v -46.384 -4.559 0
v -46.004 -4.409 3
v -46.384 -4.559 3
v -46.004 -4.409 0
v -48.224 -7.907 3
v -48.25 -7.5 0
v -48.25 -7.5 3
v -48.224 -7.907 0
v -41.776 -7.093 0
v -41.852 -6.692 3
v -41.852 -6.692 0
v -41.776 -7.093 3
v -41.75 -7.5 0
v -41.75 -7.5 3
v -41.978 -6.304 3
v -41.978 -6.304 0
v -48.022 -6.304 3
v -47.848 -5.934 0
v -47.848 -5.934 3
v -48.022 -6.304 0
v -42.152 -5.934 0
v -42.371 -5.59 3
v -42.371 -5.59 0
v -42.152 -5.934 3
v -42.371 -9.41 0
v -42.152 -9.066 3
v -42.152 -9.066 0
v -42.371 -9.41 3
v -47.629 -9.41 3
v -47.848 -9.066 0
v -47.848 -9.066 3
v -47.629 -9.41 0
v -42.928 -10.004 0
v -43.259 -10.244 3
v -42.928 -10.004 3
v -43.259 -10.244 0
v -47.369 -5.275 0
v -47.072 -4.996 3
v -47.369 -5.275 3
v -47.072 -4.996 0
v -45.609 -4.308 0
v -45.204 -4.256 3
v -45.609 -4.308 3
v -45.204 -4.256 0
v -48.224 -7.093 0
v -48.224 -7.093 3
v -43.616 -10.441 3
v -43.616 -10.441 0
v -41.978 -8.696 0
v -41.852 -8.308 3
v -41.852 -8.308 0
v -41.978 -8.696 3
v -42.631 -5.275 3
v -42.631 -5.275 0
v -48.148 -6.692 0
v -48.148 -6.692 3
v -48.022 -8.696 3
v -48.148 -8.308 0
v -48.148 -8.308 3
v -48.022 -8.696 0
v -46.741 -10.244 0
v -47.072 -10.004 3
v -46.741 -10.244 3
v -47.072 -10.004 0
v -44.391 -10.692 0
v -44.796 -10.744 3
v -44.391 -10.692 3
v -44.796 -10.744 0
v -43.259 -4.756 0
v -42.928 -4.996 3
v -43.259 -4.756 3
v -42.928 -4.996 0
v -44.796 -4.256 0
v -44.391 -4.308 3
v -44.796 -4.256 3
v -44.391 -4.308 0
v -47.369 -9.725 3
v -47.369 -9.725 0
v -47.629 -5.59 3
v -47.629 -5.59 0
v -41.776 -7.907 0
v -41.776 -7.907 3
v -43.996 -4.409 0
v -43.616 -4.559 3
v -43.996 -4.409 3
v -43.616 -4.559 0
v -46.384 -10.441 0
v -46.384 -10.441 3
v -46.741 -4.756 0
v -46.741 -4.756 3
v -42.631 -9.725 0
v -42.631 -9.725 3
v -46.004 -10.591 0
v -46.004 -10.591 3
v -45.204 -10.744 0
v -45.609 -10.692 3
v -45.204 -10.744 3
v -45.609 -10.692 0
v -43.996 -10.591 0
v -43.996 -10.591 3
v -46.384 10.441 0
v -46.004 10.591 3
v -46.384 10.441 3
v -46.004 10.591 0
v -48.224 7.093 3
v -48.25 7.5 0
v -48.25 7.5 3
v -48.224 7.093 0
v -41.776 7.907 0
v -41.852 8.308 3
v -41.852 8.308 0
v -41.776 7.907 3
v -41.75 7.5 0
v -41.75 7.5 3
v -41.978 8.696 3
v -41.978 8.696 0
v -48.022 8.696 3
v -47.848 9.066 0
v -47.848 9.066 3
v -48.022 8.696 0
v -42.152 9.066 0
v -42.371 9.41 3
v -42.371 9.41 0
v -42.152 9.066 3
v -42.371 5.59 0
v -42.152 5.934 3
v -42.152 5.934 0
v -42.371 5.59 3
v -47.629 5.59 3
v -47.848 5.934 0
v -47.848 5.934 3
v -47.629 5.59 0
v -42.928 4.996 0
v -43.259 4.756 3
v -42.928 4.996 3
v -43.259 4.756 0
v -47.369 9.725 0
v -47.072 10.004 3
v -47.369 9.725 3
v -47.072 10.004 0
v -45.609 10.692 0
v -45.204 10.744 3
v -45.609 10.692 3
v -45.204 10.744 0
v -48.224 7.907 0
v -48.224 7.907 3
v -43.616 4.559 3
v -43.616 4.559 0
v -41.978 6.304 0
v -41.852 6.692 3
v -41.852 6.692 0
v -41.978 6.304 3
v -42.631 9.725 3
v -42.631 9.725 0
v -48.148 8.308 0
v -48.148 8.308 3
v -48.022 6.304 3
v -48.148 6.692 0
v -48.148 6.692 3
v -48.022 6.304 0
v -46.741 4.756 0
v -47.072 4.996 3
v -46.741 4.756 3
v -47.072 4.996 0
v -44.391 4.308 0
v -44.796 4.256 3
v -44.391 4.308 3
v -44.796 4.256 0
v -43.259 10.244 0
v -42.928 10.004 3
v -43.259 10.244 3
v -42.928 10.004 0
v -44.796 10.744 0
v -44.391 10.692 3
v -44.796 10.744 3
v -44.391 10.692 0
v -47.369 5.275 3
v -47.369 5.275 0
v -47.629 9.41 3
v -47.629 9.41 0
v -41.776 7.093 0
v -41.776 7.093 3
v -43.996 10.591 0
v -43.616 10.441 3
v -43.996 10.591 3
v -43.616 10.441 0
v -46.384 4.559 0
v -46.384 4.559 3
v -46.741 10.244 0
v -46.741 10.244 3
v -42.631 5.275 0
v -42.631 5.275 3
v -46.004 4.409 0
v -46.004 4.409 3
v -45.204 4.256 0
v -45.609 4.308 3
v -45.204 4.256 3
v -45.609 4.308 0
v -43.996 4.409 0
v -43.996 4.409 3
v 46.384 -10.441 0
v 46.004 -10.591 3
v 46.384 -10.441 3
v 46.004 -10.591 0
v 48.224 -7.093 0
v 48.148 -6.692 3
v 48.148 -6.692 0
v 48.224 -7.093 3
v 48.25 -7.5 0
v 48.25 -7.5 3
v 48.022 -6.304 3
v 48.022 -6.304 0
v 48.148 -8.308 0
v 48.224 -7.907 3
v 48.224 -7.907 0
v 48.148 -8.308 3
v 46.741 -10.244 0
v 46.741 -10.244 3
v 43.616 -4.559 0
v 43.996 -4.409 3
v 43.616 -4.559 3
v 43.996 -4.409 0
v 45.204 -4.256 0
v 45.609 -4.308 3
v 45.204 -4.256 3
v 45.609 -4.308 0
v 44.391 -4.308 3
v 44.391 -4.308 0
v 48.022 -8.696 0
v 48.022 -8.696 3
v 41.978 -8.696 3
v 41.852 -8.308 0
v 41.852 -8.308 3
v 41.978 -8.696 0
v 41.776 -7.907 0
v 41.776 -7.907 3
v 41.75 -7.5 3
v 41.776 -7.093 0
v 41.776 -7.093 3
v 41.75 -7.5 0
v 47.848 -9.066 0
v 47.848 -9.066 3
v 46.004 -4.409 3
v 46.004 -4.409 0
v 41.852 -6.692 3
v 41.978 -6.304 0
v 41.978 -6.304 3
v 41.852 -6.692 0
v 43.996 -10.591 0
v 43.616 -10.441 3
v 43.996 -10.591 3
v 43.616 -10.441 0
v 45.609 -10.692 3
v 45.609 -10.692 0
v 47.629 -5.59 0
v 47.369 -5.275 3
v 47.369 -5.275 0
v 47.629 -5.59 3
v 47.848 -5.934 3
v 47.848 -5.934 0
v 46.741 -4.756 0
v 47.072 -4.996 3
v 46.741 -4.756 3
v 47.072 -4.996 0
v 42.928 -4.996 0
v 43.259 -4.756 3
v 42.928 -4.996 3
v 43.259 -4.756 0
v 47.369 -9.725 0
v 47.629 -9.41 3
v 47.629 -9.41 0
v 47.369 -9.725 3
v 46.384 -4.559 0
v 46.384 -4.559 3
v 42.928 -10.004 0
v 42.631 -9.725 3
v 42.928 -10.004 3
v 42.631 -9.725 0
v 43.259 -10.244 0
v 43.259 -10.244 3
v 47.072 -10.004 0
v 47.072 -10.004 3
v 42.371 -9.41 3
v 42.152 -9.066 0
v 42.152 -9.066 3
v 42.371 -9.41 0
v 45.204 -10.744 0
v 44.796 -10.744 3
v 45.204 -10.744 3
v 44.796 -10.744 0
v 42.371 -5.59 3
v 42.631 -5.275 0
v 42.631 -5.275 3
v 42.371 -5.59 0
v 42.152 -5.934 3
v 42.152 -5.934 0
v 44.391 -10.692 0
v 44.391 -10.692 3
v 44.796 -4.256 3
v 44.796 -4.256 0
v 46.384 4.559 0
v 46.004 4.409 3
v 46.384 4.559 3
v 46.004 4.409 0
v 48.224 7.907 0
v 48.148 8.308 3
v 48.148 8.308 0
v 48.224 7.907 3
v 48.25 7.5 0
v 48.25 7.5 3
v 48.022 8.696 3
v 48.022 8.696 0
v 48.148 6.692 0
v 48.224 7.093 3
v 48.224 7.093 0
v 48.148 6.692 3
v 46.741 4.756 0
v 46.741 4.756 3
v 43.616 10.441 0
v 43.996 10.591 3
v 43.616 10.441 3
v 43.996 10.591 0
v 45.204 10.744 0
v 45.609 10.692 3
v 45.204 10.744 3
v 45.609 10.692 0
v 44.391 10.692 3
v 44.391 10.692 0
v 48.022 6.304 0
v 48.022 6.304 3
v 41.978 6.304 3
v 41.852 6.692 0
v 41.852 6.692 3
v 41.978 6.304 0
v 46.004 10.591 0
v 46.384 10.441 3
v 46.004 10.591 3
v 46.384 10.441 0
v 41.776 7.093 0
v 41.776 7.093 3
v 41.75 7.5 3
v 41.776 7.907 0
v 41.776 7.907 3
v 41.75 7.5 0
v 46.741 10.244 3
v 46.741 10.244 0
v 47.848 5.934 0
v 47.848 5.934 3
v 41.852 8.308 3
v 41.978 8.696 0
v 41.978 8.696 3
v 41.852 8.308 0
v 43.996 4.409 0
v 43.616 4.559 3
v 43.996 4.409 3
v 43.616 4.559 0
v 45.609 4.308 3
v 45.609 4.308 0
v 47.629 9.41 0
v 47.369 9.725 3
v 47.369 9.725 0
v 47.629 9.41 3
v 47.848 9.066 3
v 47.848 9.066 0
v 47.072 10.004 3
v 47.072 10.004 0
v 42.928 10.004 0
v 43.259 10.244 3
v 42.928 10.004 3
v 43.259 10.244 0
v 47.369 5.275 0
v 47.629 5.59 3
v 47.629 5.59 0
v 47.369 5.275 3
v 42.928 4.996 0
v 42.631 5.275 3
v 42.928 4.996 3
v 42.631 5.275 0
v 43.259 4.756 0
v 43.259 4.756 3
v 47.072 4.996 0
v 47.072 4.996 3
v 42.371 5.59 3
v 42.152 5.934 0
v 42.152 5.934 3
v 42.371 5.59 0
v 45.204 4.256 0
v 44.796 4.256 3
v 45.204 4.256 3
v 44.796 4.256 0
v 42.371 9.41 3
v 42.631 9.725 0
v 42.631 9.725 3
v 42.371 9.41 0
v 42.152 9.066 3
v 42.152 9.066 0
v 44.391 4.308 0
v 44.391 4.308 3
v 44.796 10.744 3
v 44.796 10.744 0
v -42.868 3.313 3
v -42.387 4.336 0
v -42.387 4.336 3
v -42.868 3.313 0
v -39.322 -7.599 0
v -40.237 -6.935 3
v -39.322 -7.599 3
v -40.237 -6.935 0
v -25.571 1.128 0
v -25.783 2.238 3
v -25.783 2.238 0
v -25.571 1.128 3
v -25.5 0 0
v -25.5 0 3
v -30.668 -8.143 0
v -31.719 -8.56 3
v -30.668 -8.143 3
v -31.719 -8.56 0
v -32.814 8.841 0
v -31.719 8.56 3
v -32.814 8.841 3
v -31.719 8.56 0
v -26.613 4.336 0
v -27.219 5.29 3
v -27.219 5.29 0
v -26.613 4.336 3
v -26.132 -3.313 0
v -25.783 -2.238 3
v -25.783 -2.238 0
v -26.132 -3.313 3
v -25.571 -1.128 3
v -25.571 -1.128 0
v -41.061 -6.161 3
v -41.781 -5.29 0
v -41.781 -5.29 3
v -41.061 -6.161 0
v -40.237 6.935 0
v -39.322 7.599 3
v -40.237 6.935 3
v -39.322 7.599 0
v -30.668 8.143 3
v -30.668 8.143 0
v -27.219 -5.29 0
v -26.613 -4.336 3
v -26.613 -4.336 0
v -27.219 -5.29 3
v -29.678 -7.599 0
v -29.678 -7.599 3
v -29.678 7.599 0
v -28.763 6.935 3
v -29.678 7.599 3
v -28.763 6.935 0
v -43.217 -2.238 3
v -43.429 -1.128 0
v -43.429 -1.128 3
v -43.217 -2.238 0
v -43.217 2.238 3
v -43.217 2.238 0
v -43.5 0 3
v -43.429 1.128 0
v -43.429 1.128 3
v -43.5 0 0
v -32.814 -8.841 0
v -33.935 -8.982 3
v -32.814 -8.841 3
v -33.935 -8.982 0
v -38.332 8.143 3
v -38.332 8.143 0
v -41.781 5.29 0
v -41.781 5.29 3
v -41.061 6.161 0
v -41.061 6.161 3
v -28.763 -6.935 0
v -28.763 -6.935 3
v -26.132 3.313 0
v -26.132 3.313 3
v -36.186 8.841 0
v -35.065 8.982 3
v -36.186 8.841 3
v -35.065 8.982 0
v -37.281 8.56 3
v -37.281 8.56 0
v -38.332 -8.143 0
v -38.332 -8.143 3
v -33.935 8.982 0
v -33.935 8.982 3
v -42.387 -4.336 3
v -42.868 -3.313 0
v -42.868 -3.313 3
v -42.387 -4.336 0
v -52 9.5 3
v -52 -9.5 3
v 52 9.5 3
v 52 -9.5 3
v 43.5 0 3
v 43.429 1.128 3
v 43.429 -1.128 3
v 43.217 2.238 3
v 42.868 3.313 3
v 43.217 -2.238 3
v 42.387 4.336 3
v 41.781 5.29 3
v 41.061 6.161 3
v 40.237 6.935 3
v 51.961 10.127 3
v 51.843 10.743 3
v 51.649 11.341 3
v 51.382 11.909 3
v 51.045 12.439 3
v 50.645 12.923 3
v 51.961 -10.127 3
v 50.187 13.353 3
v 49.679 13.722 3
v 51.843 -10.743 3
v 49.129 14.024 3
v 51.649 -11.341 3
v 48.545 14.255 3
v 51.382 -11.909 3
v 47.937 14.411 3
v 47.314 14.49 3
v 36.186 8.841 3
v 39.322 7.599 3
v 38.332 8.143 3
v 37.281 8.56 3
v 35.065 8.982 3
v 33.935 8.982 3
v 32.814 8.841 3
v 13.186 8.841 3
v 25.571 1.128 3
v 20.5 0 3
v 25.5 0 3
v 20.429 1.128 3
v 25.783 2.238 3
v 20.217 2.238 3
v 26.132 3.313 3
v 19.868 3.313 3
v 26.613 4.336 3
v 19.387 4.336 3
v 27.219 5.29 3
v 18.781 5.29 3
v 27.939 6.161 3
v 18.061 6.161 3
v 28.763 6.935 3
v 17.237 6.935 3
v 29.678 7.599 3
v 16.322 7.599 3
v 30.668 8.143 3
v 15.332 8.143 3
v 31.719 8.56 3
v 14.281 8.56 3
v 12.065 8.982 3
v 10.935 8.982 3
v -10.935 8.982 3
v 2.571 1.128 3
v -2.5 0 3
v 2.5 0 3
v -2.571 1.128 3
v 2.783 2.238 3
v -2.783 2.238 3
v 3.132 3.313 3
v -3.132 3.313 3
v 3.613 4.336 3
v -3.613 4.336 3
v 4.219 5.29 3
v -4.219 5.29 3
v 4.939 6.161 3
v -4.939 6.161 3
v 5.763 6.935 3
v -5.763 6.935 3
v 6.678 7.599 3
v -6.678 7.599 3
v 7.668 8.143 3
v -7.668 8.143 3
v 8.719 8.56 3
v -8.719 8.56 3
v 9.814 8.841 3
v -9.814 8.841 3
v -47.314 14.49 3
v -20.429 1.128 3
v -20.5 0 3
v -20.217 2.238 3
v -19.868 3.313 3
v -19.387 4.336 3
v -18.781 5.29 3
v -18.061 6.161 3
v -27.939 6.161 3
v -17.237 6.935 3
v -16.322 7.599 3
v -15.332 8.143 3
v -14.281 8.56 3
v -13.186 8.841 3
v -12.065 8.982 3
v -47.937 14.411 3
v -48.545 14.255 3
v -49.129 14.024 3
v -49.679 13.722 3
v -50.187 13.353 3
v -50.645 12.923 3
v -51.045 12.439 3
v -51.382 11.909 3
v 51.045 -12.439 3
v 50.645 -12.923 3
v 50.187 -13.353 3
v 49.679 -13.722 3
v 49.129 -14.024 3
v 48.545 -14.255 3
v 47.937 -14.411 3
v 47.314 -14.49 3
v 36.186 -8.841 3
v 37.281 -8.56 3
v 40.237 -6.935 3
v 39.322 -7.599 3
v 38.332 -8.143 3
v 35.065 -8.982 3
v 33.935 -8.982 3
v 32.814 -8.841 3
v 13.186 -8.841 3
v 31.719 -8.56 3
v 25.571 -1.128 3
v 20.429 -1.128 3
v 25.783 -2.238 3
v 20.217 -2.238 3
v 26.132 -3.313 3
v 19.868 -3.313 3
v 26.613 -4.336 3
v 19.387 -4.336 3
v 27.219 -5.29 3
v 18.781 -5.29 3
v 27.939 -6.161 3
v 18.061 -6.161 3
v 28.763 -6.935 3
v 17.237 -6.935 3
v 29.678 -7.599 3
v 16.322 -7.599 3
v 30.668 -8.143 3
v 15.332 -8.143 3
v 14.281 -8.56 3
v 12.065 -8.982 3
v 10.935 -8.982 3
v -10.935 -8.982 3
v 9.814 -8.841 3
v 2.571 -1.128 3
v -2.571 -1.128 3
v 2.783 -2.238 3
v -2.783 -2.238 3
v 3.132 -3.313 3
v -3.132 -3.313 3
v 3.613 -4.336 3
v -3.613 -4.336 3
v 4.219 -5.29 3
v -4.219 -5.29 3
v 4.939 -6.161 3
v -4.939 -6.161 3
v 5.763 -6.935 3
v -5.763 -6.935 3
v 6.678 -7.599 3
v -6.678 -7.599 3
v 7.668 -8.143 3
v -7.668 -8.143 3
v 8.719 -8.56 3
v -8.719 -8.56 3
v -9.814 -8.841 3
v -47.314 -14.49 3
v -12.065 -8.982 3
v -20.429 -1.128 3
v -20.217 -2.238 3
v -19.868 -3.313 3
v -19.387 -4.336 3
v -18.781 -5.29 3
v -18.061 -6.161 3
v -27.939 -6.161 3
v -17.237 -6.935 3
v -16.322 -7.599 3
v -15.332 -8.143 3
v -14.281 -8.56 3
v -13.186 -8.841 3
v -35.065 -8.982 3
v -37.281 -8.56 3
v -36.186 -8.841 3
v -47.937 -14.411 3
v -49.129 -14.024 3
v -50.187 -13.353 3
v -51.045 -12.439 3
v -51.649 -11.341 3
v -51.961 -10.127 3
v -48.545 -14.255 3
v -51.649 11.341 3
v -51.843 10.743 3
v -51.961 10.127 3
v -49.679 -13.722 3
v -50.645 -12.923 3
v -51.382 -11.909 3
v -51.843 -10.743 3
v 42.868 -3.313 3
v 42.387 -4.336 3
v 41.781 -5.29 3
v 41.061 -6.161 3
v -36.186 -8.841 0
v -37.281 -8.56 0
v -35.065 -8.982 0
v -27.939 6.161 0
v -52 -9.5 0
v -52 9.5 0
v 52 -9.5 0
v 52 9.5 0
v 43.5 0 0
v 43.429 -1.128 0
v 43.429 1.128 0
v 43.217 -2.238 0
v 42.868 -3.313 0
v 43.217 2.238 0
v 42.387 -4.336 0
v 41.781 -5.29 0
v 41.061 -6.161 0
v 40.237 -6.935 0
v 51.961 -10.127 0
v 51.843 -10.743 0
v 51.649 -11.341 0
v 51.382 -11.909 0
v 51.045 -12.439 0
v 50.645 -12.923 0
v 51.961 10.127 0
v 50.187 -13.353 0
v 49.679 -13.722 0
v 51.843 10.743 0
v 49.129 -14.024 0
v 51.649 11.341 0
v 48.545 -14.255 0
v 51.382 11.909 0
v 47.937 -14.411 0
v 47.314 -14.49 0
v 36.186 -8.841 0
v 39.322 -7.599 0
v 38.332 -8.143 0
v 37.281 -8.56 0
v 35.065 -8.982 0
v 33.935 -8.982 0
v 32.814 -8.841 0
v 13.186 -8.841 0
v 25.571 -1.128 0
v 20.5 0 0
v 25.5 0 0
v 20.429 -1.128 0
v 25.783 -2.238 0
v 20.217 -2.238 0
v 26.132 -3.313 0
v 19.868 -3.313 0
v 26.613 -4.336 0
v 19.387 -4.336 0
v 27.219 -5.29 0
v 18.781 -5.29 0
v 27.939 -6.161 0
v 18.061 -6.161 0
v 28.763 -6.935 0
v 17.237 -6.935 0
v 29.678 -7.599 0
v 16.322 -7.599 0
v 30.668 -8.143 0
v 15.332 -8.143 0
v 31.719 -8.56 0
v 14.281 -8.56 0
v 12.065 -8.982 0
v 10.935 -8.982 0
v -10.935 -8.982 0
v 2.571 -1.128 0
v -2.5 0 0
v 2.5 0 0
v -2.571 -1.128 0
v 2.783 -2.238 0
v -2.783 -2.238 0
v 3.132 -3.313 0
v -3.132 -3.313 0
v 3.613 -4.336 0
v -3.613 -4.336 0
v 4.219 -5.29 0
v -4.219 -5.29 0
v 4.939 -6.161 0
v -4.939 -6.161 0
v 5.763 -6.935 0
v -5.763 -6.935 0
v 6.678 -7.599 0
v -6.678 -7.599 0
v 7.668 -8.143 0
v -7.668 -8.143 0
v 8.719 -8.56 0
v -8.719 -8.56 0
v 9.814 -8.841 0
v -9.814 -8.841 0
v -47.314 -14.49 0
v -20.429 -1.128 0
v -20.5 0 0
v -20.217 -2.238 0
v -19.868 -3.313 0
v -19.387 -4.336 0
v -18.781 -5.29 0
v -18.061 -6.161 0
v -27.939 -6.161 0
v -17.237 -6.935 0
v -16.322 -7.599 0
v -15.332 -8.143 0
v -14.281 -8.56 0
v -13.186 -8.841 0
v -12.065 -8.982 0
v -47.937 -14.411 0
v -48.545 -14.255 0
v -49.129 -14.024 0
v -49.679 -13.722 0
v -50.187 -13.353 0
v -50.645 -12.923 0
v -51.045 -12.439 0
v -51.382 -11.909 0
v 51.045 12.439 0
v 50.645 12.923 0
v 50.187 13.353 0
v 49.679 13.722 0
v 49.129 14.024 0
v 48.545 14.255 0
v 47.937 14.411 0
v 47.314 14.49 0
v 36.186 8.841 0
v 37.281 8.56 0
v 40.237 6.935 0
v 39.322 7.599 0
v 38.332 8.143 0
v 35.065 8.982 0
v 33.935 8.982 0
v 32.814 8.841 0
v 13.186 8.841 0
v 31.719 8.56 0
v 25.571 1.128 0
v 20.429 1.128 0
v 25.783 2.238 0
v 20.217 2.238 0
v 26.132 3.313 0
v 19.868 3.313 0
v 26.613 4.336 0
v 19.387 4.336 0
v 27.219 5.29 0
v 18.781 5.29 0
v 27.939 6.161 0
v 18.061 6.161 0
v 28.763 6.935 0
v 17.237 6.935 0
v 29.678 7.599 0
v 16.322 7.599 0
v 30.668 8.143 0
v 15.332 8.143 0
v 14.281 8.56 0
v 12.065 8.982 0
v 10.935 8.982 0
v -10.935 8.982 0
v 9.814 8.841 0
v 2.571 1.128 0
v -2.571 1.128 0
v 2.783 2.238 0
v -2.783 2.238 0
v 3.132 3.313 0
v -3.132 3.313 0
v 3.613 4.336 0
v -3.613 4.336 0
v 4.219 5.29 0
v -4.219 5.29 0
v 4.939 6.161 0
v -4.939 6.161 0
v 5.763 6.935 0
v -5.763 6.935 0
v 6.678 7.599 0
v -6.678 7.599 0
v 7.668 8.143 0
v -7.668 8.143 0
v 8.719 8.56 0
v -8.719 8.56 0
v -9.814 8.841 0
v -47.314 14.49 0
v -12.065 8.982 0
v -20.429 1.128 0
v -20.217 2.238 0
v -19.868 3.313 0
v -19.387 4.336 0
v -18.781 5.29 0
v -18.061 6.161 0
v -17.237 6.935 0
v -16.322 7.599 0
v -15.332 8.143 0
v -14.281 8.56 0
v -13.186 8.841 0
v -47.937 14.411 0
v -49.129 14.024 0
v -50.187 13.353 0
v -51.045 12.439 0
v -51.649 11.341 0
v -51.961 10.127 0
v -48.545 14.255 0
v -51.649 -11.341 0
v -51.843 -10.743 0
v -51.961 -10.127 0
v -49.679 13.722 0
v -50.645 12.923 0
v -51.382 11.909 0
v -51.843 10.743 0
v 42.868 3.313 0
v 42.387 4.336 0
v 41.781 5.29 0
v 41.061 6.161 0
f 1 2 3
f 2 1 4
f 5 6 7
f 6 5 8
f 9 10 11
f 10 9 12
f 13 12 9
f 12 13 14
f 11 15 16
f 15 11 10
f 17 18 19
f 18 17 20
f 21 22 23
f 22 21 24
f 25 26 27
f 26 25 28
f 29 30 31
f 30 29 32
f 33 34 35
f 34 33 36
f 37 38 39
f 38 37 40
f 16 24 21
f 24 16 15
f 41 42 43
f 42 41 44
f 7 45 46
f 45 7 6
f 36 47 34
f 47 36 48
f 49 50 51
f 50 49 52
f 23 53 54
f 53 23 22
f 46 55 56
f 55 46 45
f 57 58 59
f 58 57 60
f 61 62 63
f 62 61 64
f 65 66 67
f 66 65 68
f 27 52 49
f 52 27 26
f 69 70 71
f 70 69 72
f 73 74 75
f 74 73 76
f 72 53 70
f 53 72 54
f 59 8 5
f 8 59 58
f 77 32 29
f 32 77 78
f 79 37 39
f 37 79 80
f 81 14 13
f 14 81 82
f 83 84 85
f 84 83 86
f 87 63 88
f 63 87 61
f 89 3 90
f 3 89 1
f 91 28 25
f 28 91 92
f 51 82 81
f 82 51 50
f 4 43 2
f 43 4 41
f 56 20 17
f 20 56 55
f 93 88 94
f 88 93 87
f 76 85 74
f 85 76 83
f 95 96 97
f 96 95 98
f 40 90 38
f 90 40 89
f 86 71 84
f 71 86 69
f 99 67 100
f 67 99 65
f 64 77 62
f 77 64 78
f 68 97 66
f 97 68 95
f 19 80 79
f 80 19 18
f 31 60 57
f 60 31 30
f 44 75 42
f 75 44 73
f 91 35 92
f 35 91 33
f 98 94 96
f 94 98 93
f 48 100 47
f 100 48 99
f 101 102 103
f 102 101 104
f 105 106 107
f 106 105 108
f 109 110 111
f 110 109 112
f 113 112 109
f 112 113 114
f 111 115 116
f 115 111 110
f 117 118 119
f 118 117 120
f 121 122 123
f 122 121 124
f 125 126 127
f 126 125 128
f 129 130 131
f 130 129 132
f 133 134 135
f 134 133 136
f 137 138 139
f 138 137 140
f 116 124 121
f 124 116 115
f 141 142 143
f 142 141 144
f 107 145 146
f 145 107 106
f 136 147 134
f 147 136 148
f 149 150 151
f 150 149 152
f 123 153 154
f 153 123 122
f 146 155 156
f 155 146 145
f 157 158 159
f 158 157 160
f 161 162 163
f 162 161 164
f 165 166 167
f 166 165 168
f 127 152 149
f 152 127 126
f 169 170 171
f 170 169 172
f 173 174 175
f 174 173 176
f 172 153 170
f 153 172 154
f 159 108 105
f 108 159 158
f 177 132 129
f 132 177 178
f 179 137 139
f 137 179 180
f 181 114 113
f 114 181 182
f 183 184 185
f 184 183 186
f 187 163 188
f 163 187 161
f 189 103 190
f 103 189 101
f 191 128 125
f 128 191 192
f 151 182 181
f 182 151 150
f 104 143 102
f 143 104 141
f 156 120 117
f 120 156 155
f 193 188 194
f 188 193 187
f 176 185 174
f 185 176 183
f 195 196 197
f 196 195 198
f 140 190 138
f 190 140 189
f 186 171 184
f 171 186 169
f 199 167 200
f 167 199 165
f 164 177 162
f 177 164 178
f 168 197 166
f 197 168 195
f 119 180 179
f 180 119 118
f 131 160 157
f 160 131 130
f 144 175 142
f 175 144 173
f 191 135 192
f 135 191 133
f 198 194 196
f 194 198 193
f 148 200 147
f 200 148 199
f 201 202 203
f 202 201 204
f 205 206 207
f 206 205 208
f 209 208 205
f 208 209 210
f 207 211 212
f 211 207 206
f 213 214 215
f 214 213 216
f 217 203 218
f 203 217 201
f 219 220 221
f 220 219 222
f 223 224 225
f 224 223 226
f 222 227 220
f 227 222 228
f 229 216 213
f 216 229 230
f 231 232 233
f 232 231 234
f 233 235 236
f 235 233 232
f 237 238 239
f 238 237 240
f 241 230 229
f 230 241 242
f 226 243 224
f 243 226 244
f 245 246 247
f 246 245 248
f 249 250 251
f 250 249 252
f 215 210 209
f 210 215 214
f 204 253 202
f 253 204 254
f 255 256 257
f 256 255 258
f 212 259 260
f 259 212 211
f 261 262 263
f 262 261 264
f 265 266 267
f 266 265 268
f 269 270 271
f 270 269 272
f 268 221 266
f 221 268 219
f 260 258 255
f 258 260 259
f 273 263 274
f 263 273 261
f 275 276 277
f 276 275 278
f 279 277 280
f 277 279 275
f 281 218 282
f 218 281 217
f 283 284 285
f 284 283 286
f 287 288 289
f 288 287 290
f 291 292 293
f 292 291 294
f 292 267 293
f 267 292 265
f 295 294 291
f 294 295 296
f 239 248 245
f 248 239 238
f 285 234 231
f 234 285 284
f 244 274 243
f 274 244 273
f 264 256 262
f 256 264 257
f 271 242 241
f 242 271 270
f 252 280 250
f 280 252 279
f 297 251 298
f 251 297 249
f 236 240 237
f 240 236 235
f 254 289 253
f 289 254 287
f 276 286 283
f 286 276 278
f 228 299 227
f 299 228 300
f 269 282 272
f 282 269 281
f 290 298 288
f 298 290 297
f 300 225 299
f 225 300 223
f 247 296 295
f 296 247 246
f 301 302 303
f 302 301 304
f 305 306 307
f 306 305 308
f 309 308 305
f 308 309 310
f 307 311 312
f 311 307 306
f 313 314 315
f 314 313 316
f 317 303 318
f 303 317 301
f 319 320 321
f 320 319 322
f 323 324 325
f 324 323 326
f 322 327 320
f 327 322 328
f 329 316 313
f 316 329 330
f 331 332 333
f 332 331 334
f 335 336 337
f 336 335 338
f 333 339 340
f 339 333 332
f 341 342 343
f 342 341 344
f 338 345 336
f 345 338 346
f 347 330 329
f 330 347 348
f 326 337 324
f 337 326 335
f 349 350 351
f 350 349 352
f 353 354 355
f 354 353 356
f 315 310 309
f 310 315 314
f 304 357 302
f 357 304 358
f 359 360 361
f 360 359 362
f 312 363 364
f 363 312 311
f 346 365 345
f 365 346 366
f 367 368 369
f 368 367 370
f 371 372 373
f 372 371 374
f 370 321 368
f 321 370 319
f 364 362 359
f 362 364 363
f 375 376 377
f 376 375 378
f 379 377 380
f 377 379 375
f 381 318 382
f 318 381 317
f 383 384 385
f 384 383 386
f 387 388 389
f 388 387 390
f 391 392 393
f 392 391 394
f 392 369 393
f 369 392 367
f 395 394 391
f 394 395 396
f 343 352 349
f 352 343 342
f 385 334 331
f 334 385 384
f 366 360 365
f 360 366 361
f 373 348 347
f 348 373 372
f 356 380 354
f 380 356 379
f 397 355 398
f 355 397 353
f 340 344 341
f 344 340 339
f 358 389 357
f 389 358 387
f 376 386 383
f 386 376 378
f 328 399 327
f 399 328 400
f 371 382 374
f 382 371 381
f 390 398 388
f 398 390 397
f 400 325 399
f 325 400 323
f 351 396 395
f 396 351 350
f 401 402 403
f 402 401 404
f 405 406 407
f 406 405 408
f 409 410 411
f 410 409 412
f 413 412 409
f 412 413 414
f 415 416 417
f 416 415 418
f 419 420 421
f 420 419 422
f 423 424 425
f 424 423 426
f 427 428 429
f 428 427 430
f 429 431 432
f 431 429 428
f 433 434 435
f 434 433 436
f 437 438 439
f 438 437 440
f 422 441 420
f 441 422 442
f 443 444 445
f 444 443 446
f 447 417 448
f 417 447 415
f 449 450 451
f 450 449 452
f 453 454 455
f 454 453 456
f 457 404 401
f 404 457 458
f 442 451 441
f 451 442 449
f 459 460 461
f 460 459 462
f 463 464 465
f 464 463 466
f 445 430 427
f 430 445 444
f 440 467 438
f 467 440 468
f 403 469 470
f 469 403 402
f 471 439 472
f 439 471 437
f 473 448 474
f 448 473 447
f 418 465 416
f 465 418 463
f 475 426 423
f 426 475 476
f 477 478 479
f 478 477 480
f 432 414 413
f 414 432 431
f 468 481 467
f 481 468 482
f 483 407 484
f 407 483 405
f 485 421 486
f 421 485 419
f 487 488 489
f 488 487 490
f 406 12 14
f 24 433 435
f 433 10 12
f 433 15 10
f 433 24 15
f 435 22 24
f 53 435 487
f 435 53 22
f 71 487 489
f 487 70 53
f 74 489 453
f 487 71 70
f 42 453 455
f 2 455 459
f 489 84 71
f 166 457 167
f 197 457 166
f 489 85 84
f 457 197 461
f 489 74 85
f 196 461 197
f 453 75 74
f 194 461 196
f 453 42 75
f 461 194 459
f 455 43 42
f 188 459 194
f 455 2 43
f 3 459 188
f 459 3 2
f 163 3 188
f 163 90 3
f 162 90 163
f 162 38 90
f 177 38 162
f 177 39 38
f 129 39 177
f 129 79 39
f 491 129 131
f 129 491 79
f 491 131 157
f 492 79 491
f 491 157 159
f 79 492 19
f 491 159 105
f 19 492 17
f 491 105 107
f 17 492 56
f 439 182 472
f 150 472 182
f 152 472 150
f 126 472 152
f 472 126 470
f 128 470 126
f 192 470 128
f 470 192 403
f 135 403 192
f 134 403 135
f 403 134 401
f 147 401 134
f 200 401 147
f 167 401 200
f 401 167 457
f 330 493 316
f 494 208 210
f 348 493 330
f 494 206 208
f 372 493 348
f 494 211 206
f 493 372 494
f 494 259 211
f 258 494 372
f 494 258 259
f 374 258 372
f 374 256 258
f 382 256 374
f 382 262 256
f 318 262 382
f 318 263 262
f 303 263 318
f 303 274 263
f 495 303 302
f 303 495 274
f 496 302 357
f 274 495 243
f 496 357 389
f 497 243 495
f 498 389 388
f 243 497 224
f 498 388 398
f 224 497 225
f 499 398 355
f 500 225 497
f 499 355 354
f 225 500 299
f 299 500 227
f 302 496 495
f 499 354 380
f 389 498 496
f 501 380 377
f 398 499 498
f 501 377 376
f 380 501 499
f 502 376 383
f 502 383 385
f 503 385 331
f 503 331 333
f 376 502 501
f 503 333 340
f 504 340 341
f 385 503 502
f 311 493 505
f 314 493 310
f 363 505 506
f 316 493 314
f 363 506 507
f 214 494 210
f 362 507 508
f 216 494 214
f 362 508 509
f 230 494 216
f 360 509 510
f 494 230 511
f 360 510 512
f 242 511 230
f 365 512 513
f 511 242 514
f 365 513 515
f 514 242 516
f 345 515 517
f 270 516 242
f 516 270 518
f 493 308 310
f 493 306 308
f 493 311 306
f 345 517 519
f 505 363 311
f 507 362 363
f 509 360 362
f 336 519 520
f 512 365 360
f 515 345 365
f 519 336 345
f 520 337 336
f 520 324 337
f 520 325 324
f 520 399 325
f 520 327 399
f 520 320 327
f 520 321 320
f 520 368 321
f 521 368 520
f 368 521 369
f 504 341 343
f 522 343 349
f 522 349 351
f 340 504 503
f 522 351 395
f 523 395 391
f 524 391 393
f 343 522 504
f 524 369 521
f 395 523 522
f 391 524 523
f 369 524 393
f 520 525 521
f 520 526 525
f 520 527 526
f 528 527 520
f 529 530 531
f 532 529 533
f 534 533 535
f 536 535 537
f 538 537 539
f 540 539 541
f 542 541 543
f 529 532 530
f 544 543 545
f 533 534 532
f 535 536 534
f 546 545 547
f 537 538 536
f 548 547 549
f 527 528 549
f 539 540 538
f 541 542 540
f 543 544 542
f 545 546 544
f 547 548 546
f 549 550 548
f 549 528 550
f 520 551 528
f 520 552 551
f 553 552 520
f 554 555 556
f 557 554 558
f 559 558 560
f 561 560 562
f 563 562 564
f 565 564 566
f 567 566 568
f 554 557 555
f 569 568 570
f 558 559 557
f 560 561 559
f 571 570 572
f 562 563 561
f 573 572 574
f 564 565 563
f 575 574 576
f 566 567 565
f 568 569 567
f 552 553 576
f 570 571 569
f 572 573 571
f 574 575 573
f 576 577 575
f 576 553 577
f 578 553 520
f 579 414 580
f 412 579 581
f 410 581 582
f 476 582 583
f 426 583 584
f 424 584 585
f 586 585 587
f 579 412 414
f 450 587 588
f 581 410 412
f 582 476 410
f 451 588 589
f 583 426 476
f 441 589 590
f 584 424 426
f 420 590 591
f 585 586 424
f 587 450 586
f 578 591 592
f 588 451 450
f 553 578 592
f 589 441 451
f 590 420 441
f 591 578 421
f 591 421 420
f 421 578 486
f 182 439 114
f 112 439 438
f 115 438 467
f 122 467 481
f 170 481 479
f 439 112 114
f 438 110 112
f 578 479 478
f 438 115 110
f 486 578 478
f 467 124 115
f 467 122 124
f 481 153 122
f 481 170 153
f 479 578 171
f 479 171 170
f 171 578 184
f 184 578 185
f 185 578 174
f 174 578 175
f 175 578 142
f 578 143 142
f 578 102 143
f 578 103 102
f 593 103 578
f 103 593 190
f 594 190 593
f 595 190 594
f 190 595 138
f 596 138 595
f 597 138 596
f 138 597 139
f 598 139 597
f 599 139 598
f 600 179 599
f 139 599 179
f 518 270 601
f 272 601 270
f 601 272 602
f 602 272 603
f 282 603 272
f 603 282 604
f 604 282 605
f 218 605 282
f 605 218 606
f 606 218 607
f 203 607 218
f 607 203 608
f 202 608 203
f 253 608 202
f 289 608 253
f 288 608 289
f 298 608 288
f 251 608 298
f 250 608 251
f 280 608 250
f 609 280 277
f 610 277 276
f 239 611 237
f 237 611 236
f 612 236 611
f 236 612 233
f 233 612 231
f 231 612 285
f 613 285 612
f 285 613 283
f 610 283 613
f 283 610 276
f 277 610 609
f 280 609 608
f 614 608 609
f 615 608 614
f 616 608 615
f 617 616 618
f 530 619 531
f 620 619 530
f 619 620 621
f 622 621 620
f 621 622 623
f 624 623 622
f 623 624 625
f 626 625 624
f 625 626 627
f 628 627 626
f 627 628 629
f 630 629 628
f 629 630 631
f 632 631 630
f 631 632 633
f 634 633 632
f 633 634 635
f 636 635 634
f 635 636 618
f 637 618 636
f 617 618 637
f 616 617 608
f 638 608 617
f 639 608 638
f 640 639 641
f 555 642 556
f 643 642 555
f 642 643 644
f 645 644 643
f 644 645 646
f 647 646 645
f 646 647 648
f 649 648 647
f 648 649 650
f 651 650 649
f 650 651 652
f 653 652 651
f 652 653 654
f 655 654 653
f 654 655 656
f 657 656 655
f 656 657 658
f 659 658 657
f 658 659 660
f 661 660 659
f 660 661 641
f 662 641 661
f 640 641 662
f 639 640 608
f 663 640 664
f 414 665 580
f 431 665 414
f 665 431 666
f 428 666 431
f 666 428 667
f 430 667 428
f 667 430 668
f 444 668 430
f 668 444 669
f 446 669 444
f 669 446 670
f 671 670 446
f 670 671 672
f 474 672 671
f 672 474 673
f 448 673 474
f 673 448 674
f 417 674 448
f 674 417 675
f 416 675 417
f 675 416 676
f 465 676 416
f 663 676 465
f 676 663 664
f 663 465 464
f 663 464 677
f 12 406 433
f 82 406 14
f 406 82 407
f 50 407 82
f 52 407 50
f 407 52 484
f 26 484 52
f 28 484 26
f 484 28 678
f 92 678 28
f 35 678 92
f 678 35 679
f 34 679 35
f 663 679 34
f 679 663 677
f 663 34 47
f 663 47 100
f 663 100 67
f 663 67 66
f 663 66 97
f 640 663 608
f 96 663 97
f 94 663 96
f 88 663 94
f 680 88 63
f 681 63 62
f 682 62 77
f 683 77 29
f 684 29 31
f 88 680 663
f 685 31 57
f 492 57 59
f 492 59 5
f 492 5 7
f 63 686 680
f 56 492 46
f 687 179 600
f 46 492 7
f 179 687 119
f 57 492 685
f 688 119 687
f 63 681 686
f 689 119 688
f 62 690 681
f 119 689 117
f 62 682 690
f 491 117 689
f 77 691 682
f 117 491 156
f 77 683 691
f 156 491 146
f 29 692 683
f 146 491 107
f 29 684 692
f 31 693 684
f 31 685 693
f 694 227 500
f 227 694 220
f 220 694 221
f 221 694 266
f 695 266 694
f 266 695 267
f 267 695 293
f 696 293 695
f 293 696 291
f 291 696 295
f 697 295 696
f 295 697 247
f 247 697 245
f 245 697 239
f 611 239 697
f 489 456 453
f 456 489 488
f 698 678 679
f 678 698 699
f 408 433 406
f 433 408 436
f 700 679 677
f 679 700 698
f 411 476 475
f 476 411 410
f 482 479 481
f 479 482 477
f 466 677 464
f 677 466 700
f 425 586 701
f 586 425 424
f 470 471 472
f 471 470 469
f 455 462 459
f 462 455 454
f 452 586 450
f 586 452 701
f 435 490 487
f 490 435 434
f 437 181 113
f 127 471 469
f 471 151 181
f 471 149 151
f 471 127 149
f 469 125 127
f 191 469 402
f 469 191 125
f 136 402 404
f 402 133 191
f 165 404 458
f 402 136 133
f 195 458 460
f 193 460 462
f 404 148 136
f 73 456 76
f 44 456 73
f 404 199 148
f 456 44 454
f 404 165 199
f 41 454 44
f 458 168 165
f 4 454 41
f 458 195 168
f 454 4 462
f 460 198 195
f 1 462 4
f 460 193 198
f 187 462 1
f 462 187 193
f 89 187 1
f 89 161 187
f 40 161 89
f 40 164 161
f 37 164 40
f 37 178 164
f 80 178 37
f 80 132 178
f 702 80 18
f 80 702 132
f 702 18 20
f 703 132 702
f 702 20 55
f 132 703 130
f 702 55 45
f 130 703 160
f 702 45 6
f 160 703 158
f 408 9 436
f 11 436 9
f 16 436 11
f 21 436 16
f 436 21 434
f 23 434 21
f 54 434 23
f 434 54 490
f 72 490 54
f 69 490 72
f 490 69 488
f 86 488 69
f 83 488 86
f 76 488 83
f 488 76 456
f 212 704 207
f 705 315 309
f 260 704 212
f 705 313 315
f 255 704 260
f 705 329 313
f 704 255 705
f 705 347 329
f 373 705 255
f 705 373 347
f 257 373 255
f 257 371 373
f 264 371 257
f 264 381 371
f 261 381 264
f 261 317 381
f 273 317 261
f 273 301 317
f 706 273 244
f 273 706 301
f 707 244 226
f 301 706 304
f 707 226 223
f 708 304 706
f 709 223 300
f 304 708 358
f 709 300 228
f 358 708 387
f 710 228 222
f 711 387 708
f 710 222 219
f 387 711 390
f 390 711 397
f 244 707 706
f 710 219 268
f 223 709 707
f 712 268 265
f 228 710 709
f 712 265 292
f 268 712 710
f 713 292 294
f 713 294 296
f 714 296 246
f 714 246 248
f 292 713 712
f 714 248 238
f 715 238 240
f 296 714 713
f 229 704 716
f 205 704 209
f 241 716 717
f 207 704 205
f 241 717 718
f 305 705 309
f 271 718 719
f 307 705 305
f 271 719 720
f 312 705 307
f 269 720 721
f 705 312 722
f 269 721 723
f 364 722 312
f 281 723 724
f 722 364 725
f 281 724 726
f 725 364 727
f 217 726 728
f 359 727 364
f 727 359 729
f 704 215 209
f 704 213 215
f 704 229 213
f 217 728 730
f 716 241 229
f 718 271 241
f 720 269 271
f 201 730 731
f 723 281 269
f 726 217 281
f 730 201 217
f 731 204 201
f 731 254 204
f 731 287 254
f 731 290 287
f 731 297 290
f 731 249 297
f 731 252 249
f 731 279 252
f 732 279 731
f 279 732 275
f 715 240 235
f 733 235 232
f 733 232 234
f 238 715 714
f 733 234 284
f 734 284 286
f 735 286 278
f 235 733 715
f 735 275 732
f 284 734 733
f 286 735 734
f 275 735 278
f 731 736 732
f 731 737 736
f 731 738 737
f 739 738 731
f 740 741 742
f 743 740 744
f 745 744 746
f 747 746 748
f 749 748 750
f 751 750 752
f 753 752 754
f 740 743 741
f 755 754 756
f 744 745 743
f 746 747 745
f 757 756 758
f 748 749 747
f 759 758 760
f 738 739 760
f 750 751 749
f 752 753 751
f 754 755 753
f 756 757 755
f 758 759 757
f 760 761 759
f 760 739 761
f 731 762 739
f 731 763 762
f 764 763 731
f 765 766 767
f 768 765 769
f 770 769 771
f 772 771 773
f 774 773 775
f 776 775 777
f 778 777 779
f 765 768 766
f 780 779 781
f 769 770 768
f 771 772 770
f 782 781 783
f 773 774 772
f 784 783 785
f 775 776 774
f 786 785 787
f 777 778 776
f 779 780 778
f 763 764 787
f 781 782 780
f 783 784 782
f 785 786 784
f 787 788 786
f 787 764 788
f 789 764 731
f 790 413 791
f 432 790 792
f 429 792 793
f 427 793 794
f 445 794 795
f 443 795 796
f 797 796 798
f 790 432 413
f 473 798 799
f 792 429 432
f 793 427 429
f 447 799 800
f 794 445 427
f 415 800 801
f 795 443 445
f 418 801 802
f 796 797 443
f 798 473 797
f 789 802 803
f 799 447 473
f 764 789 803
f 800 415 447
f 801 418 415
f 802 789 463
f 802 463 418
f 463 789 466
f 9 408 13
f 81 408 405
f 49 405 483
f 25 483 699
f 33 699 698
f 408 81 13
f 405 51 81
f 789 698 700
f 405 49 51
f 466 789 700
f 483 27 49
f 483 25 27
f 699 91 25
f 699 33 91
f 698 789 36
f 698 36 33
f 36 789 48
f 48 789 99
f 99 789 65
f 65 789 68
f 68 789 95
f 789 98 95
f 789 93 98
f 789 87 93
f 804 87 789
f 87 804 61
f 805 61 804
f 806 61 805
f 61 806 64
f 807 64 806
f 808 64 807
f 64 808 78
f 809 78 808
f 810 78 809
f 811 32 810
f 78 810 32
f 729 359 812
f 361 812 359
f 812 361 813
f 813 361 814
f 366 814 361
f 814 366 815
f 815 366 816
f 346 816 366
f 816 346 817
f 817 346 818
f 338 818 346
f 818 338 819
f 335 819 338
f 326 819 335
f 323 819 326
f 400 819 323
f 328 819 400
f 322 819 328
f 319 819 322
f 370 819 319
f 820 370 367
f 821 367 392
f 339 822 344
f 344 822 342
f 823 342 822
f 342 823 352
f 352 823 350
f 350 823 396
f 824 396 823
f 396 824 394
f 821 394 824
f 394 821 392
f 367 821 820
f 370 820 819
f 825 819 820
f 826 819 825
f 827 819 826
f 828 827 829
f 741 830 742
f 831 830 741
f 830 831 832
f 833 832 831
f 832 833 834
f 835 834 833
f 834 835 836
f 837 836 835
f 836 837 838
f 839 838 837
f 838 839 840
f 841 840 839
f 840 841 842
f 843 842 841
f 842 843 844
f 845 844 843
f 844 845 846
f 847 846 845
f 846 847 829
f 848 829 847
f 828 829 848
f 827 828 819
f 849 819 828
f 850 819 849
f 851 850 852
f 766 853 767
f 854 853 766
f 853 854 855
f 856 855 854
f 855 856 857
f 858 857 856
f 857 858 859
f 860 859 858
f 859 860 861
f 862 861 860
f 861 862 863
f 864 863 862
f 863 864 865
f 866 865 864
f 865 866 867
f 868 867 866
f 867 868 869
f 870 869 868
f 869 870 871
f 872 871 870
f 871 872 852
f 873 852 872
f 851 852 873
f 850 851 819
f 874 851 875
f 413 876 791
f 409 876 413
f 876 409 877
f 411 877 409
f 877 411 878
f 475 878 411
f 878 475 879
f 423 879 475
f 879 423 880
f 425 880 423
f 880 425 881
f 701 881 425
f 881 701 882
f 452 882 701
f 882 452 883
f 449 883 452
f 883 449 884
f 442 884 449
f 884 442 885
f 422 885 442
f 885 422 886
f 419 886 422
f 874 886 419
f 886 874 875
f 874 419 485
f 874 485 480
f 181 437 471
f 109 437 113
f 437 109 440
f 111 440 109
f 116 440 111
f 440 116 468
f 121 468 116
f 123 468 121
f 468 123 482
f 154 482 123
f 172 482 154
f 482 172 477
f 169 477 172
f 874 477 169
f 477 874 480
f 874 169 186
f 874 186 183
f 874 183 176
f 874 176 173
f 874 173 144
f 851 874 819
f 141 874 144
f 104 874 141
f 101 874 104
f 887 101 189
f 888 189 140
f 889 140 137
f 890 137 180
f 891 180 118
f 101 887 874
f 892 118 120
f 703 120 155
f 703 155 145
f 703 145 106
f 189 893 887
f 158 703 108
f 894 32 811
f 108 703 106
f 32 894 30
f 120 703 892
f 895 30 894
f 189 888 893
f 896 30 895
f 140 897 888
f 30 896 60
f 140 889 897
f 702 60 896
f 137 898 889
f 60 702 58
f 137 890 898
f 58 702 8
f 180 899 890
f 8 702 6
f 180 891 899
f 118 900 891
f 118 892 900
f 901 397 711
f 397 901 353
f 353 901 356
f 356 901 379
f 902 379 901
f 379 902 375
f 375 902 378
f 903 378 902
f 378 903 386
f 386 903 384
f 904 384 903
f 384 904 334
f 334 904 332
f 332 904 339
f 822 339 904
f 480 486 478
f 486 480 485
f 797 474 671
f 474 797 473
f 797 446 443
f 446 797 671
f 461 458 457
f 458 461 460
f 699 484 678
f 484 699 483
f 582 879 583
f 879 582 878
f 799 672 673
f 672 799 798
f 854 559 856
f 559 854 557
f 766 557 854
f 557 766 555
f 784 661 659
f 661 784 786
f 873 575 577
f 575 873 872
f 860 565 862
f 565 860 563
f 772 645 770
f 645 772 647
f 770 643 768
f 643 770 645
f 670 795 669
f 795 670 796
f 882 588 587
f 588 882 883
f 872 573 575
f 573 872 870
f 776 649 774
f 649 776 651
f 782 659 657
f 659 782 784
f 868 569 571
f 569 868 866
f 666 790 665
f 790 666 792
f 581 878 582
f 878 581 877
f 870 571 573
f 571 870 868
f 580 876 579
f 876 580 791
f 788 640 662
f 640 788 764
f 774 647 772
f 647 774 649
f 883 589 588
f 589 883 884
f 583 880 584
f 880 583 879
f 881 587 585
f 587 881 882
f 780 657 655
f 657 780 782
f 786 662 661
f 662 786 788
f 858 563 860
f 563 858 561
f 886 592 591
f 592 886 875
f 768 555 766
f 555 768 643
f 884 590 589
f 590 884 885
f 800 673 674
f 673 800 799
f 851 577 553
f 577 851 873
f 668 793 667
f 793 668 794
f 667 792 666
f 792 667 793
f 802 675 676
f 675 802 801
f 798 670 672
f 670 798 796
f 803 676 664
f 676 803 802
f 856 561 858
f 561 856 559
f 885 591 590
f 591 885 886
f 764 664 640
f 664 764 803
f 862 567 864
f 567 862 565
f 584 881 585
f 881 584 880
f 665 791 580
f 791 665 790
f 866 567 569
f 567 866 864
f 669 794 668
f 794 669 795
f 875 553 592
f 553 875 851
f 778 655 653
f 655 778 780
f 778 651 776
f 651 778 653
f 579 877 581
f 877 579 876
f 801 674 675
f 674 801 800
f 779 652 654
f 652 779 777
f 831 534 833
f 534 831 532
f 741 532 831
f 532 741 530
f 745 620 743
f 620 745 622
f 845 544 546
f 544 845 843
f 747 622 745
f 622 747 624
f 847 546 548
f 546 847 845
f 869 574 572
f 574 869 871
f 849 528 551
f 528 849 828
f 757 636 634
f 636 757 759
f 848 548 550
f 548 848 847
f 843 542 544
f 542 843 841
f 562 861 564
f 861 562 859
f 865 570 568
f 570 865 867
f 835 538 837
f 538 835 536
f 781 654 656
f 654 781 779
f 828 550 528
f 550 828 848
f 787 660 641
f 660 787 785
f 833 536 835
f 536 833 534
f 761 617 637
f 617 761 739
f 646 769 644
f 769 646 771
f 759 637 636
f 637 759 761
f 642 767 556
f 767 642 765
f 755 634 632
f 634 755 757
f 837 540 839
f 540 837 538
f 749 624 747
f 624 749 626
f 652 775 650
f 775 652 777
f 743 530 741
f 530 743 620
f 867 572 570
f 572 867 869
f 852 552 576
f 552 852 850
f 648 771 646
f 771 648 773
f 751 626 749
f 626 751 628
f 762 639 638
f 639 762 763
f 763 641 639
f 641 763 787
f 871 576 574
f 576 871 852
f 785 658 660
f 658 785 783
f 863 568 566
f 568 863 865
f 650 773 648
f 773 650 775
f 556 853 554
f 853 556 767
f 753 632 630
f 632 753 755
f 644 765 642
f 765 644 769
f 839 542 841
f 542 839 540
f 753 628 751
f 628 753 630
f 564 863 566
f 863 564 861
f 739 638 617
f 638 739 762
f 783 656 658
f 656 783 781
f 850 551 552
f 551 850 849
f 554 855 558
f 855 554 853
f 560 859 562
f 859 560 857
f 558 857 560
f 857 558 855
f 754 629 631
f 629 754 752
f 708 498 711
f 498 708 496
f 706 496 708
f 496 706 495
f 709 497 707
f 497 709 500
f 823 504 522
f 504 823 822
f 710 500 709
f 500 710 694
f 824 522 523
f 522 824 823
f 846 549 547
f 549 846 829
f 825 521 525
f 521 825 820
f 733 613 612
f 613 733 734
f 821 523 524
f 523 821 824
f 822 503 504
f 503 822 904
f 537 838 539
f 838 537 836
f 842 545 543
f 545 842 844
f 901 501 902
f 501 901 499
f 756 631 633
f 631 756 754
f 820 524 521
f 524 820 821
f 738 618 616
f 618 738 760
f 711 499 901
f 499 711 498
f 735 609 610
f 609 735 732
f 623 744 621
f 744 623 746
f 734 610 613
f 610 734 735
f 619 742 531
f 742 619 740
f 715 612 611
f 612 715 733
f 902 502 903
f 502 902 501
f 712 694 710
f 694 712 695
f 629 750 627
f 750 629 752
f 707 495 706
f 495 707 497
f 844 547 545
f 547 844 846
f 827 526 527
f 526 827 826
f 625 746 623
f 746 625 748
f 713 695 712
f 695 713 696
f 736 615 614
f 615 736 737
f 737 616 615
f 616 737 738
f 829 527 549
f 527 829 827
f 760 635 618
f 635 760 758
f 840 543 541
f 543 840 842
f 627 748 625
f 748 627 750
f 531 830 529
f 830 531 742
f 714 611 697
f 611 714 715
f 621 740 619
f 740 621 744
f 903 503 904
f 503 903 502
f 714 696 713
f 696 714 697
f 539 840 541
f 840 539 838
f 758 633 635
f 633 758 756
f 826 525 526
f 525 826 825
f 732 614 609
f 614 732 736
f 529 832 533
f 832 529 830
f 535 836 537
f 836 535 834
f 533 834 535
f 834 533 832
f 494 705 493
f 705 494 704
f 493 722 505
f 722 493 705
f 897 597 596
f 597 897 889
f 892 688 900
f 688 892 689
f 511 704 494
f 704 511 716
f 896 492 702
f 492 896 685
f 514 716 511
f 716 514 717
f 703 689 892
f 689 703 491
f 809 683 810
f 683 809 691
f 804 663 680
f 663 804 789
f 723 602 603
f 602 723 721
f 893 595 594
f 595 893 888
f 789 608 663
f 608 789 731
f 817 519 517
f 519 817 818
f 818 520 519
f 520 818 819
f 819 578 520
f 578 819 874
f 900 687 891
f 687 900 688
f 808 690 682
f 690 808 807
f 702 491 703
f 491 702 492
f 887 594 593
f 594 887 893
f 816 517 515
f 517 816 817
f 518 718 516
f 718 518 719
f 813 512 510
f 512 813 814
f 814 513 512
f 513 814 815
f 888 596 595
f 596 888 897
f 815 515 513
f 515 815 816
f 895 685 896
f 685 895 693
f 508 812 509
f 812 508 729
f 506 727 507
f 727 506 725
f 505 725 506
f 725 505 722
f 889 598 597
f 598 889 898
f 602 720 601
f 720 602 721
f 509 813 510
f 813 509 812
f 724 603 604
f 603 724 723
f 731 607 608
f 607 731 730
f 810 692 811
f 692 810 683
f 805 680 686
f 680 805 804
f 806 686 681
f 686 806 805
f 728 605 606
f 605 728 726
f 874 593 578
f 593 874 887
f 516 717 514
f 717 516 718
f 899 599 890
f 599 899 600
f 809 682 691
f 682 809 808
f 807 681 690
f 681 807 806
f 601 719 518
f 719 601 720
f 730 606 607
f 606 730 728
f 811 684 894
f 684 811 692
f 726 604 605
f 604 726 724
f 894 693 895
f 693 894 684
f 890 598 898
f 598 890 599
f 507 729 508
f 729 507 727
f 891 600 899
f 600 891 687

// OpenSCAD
$fn = 50;


difference() {
	union() {
		hull() {
			translate(v = [-47.0000000000, 9.5000000000, 0]) {
				cylinder(h = 3, r = 5);
			}
			translate(v = [47.0000000000, 9.5000000000, 0]) {
				cylinder(h = 3, r = 5);
			}
			translate(v = [-47.0000000000, -9.5000000000, 0]) {
				cylinder(h = 3, r = 5);
			}
			translate(v = [47.0000000000, -9.5000000000, 0]) {
				cylinder(h = 3, r = 5);
			}
		}
	}
	union() {
		#translate(v = [-45.0000000000, -7.5000000000, -100.0000000000]) {
			cylinder(h = 200, r = 3.2500000000);
		}
		#translate(v = [-45.0000000000, 7.5000000000, -100.0000000000]) {
			cylinder(h = 200, r = 3.2500000000);
		}
		#translate(v = [45.0000000000, -7.5000000000, -100.0000000000]) {
			cylinder(h = 200, r = 3.2500000000);
		}
		#translate(v = [45.0000000000, 7.5000000000, -100.0000000000]) {
			cylinder(h = 200, r = 3.2500000000);
		}
		#translate(v = [-34.5000000000, 0, 0]) {
			cylinder(h = 3, r = 9.0000000000);
		}
		#translate(v = [-11.5000000000, 0, 0]) {
			cylinder(h = 3, r = 9.0000000000);
		}
		#translate(v = [11.5000000000, 0, 0]) {
			cylinder(h = 3, r = 9.0000000000);
		}
		#translate(v = [34.5000000000, 0, 0]) {
			cylinder(h = 3, r = 9.0000000000);
		}
	}
}
